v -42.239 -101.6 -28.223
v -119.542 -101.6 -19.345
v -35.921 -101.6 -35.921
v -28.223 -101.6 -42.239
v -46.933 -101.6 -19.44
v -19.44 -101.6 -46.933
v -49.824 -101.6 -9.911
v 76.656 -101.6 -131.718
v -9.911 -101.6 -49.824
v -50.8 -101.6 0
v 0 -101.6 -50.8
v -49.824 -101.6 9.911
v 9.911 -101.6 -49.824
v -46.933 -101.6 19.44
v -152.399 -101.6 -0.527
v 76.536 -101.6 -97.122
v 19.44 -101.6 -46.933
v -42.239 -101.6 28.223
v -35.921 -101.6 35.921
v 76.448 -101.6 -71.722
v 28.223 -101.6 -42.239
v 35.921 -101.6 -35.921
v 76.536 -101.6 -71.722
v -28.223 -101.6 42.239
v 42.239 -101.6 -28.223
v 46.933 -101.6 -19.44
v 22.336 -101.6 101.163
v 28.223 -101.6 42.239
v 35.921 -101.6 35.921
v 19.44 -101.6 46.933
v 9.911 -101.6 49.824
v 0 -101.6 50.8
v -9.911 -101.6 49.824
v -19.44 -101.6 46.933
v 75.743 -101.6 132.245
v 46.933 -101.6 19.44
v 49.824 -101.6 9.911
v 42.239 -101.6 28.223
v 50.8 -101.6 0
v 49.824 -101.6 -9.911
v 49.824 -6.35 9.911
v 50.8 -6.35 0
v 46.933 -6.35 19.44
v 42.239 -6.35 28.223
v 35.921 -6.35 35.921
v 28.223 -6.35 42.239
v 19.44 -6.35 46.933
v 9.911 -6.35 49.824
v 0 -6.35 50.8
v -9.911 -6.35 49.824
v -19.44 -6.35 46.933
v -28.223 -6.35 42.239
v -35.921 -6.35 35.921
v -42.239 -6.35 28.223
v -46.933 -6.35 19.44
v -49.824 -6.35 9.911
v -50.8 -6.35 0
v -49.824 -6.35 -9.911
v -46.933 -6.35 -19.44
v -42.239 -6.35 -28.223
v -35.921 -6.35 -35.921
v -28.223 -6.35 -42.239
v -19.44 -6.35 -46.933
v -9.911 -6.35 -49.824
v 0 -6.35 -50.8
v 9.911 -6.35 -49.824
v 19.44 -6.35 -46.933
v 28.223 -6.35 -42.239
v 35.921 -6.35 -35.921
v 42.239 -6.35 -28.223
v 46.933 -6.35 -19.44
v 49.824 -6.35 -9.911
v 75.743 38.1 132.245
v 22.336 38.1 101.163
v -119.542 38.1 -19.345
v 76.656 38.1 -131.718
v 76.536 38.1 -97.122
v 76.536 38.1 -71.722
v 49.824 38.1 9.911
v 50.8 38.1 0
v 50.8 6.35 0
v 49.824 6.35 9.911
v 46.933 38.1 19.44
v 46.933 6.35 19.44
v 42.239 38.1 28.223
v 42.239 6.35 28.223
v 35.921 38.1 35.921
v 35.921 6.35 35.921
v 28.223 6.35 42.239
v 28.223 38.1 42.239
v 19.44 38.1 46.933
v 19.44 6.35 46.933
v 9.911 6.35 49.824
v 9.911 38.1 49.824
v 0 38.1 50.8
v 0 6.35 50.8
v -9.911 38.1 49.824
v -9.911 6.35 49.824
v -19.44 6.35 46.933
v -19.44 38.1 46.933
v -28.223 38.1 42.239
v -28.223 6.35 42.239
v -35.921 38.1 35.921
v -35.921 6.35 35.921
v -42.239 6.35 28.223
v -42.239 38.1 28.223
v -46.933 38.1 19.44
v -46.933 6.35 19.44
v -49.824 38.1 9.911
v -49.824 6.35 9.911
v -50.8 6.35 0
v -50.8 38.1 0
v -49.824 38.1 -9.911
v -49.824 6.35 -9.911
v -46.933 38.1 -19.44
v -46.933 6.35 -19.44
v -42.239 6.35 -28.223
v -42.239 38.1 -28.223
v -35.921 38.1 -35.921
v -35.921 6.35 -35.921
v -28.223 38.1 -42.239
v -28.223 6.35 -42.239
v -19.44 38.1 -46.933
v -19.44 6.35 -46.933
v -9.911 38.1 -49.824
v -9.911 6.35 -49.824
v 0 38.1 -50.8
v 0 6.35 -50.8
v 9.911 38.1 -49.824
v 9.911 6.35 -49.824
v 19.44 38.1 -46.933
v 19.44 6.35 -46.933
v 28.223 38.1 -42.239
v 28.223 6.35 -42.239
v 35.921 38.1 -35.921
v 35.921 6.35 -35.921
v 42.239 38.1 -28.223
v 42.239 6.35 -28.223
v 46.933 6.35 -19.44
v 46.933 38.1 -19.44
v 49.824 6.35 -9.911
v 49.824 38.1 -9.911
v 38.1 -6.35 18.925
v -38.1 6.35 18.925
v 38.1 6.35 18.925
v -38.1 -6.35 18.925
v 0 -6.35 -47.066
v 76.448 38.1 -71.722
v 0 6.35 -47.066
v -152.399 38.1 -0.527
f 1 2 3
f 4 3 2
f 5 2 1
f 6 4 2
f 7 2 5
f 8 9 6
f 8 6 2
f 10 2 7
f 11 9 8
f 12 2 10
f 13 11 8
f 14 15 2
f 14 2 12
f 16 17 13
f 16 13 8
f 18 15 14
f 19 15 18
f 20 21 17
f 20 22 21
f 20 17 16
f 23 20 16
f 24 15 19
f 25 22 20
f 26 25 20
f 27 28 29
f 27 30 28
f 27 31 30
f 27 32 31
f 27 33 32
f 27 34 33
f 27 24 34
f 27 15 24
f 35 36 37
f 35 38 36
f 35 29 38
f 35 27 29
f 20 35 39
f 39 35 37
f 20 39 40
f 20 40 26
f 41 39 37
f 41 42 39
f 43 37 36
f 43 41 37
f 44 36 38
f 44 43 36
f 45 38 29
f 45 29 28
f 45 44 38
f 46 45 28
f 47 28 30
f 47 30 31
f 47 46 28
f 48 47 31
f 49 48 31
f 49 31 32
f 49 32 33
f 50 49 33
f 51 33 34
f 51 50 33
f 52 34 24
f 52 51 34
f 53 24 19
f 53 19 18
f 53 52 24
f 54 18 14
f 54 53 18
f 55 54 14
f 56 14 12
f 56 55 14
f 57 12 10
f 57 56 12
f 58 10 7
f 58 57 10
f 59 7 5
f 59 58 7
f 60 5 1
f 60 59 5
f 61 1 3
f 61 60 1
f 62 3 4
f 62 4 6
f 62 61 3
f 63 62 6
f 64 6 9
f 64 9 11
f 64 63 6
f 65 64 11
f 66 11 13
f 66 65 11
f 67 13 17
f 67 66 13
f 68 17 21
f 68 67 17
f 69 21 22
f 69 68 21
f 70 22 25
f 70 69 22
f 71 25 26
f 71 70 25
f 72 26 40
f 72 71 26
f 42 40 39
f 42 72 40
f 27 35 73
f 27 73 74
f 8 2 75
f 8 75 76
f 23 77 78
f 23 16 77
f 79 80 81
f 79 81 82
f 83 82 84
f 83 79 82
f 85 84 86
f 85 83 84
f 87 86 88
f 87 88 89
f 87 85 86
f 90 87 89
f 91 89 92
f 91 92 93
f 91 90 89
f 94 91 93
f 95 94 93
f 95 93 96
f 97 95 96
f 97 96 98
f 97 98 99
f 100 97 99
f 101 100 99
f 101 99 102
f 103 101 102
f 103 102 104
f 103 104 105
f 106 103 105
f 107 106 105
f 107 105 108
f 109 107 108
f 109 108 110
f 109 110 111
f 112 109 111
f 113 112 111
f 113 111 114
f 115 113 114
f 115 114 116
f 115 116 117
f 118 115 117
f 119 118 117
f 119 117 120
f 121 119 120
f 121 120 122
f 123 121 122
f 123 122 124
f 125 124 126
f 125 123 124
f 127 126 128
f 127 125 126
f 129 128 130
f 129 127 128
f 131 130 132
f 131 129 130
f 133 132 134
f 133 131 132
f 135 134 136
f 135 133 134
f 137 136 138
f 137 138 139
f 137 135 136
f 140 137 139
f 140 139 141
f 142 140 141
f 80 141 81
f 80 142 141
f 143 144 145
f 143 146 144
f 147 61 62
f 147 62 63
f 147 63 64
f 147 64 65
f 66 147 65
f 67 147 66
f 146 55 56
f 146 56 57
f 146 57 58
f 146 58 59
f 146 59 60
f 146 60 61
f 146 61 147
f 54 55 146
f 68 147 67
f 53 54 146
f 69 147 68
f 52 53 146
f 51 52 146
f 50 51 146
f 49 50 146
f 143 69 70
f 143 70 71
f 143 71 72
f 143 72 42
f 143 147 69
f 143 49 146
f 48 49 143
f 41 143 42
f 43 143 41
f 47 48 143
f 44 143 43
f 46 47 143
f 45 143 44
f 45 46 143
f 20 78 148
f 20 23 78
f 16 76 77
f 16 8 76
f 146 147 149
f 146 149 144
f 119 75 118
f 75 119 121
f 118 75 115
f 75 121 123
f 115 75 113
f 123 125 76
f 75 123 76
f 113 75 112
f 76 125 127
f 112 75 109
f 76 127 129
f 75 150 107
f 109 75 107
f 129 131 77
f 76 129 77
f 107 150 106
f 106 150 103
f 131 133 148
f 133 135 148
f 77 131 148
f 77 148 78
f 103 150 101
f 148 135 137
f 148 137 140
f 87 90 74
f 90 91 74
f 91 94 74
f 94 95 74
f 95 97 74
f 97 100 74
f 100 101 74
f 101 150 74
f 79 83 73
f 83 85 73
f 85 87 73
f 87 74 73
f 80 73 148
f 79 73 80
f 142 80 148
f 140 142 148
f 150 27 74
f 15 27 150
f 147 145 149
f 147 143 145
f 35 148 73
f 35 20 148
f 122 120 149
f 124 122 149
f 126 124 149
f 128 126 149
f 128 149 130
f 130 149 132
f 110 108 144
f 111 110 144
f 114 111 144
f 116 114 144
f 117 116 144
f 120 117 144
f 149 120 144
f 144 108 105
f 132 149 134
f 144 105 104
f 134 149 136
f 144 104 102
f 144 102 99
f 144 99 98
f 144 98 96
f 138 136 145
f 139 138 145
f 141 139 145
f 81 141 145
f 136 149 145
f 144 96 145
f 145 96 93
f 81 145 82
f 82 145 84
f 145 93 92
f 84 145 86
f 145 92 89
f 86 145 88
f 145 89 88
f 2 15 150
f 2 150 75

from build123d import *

# Parameters (mm, degrees)
F0_R     = 50.8
F1_DEPTH = 6.35
F2_DEPTH = 38.1
F3_DEPTH = 63.5


with BuildPart() as f1:
    # F0 (on Front) → F1 (new body, symmetric)
    with BuildSketch(Plane.XZ):
        Circle(F0_R)
        Polygon((0, -47.0656435661), (-38.1, 18.9254922023), (38.1, 18.9254922023), align=None, mode=Mode.SUBTRACT)
    extrude(amount=F1_DEPTH, both=True)

    # F0 (on Front) → F2 (join, symmetric)
    with BuildSketch(Plane.XZ):
        with BuildLine():
            add(Edge.make_bspline(
                [(75.8723819512, 94.9205090511), (75.9331390119, 77.3418365937), (1.5317360093, 89.0560595825), (22.3357510028, 101.1633279928)],
                knots=[0, 0, 0, 0, 53.8993844273, 53.8993844273, 53.8993844273, 53.8993844273], degree=3))
            Line((22.3357510028, 101.1633279928), (-119.3492407465, 18.707214336))
            Line((-119.3492407465, 18.707214336), (-152.3990897254, -0.5267360641))
            Line((-152.3990897254, -0.5267360641), (-119.5423719358, -19.3454558368))
            Line((-119.5423719358, -19.3454558368), (76.6557116753, -131.7181151837))
            Line((76.6557116753, -131.7181151837), (76.5361384347, -97.1223199462))
            Line((76.5361384347, -97.1223199462), (25.7361384347, -97.1223199462))
            Line((25.7361384347, -97.1223199462), (25.7361384347, -71.7223199462))
            Line((25.7361384347, -71.7223199462), (76.4483485663, -71.7223199462))
            Line((76.4483485663, -71.7223199462), (75.8723819512, 94.9205090511))
        make_face()
        Circle(F0_R, mode=Mode.SUBTRACT)
        with BuildLine():
            Line((75.7433780501, 132.2448512478), (22.3357510028, 101.1633279928))
            add(Edge.make_bspline(
                [(75.8723819512, 94.9205090511), (75.9331390119, 77.3418365937), (1.5317360093, 89.0560595825), (22.3357510028, 101.1633279928)],
                knots=[0, 0, 0, 0, 53.8993844273, 53.8993844273, 53.8993844273, 53.8993844273], degree=3))
            Line((75.8723819512, 94.9205090511), (75.7433780501, 132.2448512478))
        make_face()
        Polygon((76.5361384347, -71.7223199462), (76.4483485663, -71.7223199462), (76.5361384347, -97.1223199462), align=None)
        Polygon((76.5361384347, -97.1223199462), (76.4483485663, -71.7223199462), (25.7361384347, -71.7223199462), (25.7361384347, -97.1223199462), align=None)
    extrude(amount=F2_DEPTH, both=True)

    # F3 (add, symmetric): a face of the model
    f3_faces = [f1.faces().sort_by_distance(p)[0] for p in [
        (73.1010560932, -38.1, -114.4322968597),
    ]]
    extrude(f3_faces, amount=F3_DEPTH, both=True)


solid = f1.part
